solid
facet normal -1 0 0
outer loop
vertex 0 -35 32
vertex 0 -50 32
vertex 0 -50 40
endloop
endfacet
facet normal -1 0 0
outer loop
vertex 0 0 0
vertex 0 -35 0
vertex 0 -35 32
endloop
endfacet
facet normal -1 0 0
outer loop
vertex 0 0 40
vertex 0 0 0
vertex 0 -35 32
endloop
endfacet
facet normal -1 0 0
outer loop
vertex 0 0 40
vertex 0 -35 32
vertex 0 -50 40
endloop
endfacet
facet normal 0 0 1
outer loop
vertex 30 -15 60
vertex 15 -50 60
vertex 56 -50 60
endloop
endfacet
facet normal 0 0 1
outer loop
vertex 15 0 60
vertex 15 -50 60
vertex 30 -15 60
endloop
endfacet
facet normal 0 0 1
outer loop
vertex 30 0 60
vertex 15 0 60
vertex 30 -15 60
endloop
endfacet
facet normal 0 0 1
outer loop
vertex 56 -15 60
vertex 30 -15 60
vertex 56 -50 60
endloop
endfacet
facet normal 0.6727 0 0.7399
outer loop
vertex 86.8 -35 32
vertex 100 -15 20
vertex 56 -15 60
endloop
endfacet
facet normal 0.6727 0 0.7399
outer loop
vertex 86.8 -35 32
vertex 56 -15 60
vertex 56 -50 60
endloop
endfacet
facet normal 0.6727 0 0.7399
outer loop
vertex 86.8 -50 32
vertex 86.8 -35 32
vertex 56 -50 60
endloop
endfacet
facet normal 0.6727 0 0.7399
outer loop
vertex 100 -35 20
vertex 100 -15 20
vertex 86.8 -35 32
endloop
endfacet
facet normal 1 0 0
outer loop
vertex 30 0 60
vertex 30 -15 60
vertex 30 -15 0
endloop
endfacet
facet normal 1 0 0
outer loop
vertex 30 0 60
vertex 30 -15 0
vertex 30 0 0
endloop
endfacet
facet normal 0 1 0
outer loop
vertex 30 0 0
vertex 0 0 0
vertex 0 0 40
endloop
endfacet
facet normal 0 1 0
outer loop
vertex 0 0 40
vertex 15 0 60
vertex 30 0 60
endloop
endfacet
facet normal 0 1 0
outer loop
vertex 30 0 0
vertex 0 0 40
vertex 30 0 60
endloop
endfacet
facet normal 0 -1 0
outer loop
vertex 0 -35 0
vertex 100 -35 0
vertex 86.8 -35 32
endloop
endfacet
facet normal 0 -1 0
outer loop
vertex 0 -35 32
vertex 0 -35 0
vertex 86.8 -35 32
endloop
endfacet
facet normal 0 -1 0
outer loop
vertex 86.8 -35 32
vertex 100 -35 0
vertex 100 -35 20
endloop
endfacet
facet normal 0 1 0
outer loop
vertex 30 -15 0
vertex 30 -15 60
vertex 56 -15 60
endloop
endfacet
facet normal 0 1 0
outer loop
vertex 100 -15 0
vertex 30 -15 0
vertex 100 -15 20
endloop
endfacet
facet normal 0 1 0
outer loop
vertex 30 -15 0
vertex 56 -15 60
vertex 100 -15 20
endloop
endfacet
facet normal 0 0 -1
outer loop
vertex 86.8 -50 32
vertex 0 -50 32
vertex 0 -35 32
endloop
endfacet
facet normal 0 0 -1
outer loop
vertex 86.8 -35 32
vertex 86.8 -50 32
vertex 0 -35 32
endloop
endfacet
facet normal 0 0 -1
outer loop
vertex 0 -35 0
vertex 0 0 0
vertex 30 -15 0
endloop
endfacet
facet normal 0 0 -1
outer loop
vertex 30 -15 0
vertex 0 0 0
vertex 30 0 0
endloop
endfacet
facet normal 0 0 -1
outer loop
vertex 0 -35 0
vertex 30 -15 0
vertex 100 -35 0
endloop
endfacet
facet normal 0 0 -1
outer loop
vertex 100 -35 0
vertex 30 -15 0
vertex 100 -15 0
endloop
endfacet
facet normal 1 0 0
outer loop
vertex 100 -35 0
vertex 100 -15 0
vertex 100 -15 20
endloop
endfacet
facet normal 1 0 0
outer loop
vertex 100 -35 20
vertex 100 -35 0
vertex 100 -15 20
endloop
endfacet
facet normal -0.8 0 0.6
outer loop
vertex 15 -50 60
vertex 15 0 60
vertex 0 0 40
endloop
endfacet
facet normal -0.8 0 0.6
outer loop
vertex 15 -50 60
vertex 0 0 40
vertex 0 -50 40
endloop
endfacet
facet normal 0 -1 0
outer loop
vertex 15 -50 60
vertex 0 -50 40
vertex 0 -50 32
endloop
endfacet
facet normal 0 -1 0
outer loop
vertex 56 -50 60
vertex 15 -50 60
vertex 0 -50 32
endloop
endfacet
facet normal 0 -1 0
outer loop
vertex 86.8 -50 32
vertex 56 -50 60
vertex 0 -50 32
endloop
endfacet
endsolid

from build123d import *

# Parameters (mm, degrees)
F0_W     = 100
F0_H     = 60
F1_DEPTH = 50
F2_W     = 15
F2_H     = 32
F3_DEPTH = 100.001
F4_W     = 70
F4_H     = 15
F5_DEPTH = 60.001
F6_SIZE2 = 15
F6_SIZE  = 20
F7_SIZE2 = 40
F7_SIZE  = 44


with BuildPart() as f1:
    # F0 (on Front) → F1 (new body)
    with BuildSketch(Plane.XZ):
        with Locations((50, 30)):
            Rectangle(F0_W, F0_H)
    extrude(amount=F1_DEPTH)

    # F2 (on face) → F3 (cut, through all)
    with BuildSketch(Plane.YZ.offset(100)):
        with Locations((-42.5, 16)):
            Rectangle(F2_W, F2_H)
    extrude(amount=-F3_DEPTH, mode=Mode.SUBTRACT)

    # F4 (on face) → F5 (cut, through all)
    with BuildSketch(Plane.XY.offset(60)):
        with Locations((65, -7.5)):
            Rectangle(F4_W, F4_H)
    extrude(amount=-F5_DEPTH, mode=Mode.SUBTRACT)

    # F6
    f6_edges = [f1.edges().sort_by_distance(p)[0] for p in [
        (0, -25, 60),
    ]]
    chamfer(f6_edges, length=F6_SIZE, length2=F6_SIZE2)

    # F7
    f7_edges = [f1.edges().sort_by_distance(p)[0] for p in [
        (100, -32.5, 60),
    ]]
    chamfer(f7_edges, length=F7_SIZE, length2=F7_SIZE2)


solid = f1.part
